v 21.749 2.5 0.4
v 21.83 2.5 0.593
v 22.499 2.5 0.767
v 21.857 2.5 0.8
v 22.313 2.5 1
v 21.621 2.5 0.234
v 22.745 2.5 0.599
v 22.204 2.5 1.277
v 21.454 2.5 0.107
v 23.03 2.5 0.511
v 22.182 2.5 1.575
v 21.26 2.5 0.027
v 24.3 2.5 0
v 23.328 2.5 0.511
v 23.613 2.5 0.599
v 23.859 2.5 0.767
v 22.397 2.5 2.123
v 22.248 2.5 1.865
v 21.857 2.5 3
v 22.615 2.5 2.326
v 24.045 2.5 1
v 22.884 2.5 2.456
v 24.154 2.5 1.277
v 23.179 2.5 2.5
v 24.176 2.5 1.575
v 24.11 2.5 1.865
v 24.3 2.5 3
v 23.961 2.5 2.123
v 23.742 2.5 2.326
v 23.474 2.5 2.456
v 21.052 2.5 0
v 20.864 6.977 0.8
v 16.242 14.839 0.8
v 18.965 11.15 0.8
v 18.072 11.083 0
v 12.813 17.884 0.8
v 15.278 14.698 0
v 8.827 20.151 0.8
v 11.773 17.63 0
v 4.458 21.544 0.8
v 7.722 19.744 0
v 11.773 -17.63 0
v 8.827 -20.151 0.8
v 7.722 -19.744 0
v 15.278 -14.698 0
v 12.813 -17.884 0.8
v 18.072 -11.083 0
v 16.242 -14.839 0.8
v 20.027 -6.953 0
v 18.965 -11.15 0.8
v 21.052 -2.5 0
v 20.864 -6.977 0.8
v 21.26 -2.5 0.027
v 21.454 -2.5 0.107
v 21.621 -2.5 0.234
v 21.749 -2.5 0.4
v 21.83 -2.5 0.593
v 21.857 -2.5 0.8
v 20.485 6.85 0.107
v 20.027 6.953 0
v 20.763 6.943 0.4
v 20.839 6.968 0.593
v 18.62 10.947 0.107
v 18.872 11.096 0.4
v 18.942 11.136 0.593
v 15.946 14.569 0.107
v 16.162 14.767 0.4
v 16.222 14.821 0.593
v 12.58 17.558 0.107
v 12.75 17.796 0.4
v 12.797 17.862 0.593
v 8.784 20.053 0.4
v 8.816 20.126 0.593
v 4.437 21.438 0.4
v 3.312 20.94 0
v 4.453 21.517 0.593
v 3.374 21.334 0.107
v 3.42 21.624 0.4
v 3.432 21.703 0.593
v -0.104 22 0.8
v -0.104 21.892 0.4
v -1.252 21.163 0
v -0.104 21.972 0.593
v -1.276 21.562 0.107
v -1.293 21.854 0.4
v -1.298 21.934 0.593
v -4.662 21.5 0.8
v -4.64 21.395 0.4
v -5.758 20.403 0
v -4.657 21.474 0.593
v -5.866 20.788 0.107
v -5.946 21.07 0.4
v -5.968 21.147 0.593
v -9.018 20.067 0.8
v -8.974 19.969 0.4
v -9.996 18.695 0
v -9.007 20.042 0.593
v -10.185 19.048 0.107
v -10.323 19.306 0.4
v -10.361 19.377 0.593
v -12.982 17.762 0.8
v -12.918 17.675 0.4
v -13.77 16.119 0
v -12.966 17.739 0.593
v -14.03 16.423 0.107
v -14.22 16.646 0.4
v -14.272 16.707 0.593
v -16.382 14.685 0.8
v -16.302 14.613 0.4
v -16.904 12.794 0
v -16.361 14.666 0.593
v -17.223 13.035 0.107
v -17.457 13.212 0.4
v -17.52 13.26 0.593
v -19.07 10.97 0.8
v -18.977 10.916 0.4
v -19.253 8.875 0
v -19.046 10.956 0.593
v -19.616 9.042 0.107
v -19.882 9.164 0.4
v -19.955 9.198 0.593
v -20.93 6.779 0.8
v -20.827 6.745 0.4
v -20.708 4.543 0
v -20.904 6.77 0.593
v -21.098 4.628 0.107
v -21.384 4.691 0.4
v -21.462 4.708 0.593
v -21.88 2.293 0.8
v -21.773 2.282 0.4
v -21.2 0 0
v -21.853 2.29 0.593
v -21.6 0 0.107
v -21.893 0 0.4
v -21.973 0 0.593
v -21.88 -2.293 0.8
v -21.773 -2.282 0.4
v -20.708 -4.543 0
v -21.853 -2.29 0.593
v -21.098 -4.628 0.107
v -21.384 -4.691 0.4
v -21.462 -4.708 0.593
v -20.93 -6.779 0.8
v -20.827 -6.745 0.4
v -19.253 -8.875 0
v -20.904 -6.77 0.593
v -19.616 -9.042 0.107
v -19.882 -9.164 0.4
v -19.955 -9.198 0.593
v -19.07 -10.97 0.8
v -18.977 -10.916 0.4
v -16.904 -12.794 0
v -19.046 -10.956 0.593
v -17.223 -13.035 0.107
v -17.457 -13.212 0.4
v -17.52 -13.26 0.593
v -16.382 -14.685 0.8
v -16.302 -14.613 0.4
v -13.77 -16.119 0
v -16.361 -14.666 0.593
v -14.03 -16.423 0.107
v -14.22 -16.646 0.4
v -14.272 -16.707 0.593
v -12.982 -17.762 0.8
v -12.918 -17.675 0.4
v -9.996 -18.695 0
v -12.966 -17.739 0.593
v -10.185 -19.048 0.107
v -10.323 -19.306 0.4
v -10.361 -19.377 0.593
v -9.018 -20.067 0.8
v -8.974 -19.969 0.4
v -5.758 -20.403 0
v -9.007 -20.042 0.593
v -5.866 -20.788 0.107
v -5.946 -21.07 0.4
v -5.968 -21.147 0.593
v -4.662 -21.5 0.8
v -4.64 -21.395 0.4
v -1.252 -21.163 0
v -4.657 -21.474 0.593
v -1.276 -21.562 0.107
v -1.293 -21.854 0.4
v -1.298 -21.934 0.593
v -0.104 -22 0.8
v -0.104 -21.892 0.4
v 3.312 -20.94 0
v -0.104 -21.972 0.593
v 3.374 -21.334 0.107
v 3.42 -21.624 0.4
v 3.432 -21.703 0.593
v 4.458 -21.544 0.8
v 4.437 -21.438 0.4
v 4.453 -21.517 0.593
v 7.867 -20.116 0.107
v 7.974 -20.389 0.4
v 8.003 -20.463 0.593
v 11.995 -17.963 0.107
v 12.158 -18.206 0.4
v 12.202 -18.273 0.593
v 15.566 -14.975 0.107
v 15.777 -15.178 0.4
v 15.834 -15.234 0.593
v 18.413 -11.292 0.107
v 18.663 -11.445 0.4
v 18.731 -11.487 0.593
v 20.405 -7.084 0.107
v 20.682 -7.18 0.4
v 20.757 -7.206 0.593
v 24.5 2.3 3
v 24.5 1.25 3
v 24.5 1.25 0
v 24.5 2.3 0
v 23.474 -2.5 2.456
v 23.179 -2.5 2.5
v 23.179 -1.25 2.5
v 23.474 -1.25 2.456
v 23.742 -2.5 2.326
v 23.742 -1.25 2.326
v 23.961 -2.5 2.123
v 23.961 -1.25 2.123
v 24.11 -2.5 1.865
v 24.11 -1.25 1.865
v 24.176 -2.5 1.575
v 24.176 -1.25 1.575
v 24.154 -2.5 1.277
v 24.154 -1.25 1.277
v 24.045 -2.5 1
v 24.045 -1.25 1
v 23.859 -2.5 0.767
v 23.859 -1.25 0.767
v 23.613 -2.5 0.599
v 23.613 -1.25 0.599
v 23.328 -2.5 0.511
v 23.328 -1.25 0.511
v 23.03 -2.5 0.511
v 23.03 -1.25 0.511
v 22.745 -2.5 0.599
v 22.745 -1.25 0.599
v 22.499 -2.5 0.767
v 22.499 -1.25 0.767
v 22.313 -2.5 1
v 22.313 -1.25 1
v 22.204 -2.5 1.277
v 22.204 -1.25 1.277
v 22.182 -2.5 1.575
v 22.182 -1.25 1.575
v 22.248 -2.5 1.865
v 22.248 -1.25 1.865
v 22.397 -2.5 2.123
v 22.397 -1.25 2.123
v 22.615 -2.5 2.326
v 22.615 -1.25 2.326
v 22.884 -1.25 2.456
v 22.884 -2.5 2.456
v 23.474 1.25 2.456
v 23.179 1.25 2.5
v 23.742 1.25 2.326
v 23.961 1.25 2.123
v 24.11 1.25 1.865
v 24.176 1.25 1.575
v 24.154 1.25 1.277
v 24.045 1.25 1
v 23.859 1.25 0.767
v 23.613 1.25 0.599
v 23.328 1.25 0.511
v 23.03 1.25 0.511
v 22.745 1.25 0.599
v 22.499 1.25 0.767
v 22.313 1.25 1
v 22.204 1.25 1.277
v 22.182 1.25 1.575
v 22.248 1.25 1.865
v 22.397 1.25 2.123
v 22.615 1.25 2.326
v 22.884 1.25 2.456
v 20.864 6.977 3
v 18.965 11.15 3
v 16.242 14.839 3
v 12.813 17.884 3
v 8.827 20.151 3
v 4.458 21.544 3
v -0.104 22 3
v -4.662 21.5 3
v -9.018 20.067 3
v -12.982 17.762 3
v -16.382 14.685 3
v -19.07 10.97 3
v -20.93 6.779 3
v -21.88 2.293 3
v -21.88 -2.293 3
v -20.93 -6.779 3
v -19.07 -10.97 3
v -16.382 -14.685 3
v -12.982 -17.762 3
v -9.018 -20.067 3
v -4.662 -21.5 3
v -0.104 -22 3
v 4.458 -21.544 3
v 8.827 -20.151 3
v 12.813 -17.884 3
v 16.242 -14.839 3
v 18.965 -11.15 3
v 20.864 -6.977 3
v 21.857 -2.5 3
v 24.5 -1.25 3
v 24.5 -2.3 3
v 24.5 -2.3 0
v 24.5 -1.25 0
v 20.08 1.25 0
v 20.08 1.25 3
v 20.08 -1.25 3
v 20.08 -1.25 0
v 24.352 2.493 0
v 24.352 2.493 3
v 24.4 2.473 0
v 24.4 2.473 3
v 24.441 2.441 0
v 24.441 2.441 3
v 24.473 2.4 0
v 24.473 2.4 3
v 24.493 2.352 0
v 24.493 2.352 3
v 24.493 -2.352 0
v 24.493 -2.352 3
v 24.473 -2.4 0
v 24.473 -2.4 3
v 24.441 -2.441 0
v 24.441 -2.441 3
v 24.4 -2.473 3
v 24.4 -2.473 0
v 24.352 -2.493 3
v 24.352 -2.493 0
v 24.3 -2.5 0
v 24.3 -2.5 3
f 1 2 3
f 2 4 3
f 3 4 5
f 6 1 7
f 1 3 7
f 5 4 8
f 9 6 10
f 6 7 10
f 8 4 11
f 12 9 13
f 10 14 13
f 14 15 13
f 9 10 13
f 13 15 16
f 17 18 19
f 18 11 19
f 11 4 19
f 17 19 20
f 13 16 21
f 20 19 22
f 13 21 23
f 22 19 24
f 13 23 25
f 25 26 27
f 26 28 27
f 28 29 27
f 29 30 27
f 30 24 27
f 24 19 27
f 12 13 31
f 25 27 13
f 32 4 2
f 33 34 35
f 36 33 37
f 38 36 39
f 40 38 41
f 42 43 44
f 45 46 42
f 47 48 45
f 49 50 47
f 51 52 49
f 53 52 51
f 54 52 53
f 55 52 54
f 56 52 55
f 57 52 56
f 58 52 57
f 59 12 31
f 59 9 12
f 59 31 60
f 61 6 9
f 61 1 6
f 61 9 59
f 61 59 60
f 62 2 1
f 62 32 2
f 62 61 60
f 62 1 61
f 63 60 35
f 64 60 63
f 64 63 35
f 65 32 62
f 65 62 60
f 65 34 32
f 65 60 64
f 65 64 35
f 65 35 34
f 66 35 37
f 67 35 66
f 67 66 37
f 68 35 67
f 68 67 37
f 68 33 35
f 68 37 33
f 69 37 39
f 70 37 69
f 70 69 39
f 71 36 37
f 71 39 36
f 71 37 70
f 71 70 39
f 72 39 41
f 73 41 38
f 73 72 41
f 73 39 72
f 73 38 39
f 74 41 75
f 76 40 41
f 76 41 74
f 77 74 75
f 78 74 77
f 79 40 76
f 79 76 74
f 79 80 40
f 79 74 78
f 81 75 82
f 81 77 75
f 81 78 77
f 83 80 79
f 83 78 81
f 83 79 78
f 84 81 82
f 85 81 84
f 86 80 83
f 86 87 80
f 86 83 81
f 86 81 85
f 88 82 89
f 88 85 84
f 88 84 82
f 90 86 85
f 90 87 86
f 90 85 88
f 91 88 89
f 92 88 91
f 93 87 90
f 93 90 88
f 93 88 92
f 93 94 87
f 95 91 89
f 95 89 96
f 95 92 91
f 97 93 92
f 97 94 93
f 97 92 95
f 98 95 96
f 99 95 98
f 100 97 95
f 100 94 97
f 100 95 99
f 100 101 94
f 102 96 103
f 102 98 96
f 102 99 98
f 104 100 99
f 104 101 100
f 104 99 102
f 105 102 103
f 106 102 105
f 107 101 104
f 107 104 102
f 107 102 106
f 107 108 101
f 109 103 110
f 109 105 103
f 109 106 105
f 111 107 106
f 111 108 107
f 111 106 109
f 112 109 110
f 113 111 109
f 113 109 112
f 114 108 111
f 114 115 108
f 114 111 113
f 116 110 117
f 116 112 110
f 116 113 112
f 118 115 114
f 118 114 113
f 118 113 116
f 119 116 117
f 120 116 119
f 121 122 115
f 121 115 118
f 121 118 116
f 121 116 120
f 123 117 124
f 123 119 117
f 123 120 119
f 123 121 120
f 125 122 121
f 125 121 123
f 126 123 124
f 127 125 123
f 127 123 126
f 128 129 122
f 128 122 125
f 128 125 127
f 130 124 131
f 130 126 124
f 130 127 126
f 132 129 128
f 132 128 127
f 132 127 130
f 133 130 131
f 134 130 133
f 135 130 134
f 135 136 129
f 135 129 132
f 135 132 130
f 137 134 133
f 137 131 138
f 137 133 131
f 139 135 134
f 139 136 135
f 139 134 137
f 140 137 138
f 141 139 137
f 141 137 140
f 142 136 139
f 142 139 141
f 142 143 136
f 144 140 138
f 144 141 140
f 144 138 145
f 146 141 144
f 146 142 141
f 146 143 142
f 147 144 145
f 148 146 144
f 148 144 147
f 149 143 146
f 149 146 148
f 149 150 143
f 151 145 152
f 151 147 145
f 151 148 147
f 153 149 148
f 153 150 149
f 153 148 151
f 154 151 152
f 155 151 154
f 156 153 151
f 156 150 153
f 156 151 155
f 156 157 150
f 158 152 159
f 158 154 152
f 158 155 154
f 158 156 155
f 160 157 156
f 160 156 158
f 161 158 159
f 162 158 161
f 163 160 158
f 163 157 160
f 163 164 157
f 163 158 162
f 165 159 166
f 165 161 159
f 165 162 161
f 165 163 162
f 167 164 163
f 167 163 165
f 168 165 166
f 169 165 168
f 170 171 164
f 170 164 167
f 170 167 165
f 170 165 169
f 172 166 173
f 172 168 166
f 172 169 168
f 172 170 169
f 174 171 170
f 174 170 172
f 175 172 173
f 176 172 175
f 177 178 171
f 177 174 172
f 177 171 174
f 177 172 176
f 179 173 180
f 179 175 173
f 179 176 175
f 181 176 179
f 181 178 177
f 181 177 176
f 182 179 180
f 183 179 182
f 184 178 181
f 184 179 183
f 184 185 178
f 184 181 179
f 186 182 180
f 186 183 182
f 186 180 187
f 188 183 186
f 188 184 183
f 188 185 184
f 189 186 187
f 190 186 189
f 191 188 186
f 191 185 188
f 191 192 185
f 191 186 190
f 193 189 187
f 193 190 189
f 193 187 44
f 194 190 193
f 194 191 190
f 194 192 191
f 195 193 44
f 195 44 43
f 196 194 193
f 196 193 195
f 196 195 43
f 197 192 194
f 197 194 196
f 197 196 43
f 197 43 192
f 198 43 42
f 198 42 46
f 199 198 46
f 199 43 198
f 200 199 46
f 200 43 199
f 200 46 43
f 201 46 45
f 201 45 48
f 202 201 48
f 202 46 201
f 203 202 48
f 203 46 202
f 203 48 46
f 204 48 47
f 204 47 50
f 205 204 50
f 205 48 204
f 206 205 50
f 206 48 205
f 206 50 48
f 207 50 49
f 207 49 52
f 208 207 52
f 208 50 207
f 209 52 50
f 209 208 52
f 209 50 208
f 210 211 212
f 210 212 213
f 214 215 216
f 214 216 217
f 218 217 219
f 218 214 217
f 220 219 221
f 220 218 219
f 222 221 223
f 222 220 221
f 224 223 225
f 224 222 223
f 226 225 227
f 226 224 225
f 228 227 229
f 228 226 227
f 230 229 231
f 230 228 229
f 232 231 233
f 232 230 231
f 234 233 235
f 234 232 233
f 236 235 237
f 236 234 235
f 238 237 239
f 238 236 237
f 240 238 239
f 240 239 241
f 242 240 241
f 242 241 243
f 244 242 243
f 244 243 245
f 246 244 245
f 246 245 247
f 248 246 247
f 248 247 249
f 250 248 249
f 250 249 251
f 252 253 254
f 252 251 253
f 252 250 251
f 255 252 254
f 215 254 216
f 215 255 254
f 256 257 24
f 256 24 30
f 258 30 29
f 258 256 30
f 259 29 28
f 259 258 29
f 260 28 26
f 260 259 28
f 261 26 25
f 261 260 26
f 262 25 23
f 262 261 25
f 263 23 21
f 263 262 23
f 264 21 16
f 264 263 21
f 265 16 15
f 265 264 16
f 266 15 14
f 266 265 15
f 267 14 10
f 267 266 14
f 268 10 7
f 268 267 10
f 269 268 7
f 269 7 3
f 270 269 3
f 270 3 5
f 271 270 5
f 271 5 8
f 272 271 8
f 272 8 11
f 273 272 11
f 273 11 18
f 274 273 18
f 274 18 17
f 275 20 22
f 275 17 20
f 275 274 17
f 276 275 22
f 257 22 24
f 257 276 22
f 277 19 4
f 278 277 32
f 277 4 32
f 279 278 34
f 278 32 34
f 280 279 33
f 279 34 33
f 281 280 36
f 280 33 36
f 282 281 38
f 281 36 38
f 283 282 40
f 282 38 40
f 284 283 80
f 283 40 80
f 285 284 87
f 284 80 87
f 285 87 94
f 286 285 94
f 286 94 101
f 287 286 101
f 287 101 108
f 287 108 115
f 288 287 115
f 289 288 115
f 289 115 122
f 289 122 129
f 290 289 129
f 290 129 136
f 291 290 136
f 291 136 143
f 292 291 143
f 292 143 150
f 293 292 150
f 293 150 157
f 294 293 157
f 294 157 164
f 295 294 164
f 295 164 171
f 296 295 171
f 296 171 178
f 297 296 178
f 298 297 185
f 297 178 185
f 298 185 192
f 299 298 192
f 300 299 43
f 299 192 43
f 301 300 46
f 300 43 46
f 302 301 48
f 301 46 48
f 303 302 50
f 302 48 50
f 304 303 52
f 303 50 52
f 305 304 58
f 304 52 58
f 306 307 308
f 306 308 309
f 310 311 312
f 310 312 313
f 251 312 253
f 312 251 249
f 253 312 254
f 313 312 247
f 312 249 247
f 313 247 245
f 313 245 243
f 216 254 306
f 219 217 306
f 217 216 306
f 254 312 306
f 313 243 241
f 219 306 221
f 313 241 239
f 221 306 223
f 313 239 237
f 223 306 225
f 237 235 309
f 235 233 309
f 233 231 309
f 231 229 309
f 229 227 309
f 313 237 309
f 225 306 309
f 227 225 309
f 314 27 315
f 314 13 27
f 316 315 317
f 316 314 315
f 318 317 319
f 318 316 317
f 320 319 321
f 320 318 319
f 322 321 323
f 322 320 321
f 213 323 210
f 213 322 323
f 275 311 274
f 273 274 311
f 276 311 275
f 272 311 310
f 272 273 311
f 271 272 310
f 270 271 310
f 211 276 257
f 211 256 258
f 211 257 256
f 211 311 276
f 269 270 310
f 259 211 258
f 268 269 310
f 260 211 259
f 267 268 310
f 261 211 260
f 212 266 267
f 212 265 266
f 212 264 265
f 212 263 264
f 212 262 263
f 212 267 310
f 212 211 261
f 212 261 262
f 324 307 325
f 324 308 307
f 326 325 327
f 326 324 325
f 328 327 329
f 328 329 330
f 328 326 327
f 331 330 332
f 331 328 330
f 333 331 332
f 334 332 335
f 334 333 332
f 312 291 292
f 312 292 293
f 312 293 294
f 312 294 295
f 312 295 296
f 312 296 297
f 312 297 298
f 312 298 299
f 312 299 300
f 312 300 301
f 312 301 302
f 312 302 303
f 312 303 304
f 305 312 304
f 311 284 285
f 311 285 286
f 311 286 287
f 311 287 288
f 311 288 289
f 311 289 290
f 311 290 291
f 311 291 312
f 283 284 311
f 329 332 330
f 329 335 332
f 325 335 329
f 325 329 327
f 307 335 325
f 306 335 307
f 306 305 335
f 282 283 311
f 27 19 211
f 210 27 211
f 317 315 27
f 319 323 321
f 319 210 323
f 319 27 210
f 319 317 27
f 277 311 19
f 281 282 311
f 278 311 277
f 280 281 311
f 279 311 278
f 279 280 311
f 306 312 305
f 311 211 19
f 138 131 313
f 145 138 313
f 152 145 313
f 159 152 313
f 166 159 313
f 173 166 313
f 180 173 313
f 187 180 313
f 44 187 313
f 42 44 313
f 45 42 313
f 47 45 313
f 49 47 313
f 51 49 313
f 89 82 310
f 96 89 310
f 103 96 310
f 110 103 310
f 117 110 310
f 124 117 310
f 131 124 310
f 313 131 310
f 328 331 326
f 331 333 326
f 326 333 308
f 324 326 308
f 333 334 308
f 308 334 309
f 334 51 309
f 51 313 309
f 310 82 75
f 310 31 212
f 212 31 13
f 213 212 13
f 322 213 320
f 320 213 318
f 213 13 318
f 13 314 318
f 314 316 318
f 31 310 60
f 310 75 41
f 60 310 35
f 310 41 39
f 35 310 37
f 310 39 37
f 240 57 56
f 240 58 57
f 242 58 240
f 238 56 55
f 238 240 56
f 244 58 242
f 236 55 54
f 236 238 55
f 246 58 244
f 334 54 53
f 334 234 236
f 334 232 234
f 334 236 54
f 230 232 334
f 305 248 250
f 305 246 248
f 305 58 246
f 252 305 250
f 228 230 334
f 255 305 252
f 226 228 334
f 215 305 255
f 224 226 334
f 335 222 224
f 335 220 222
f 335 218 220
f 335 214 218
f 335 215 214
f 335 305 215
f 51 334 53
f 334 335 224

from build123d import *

# Parameters (mm, degrees)
SKETCH1_R               = 22
BOSS_EXTRUDE1_DEPTH     = 3
SKETCH2_W               = 5
SKETCH2_H               = 5
BOSS_EXTRUDE2_DEPTH     = 3
CUT_EXTRUDE1_DEPTH      = 35.777866525
CUT_EXTRUDE1_DEPTH_BACK = 35.777866525
SKETCH3_R               = 1
SKETCH4_W               = 3
SKETCH4_H               = 2.5
CUT_EXTRUDE2_DEPTH      = 2.6
FILLET1_R               = 0.2
FILLET2_R               = 0.8
SKETCH5_W               = 3
SKETCH5_H               = 2.5
CUT_EXTRUDE3_DEPTH      = 1.82


with BuildPart() as part:
    # Sketch1 → Boss-Extrude1 (new body)
    with BuildSketch(Plane.XY):
        Circle(SKETCH1_R)
    extrude(amount=BOSS_EXTRUDE1_DEPTH)

    # Sketch2 → Boss-Extrude2 (add)
    with BuildSketch(Plane.XY.offset(3)):
        with Locations((22, 0)):
            Rectangle(SKETCH2_W, SKETCH2_H)
    extrude(amount=-BOSS_EXTRUDE2_DEPTH)

    # Sketch3 → Cut-Extrude1 (cut, two sides: drawn at the far end of the back side and taken through both)
    with BuildSketch(Plane(origin=(0, 2.5, 0), x_dir=(1, 0, 0), z_dir=(0, 1, 0)).offset(-CUT_EXTRUDE1_DEPTH_BACK)):
        with Locations(Location((23.178746497, -1.5, 0), (0, 0, 270))):
            Circle(SKETCH3_R)
    extrude(amount=CUT_EXTRUDE1_DEPTH + CUT_EXTRUDE1_DEPTH_BACK, mode=Mode.SUBTRACT)

    # Sketch4 → Cut-Extrude2 (cut)
    with BuildSketch(Plane(origin=(24.5, 0, 0), x_dir=(0, 0, -1), z_dir=(1, 0, 0))):
        with Locations((-1.5, 0)):
            Rectangle(SKETCH4_W, SKETCH4_H)
    extrude(amount=-CUT_EXTRUDE2_DEPTH, mode=Mode.SUBTRACT)

    # Fillet1
    fillet1_edges = [part.edges().sort_by_distance(p)[0] for p in [
        (24.5, -2.5, 1.5),
        (24.5, 2.5, 1.5),
    ]]
    fillet(fillet1_edges, radius=FILLET1_R)

    # Fillet2
    fillet2_edges = [part.edges().sort_by_distance(p)[0] for p in [
        (-22, 0, 0),
    ]]
    fillet(fillet2_edges, radius=FILLET2_R)

    # Sketch5 → Cut-Extrude3 (cut)
    with BuildSketch(Plane(origin=(21.9, 0, 0), x_dir=(0, 0, -1), z_dir=(1, 0, 0))):
        with Locations((-1.5, 0)):
            Rectangle(SKETCH5_W, SKETCH5_H)
    extrude(amount=-CUT_EXTRUDE3_DEPTH, mode=Mode.SUBTRACT)


solid = part.part
